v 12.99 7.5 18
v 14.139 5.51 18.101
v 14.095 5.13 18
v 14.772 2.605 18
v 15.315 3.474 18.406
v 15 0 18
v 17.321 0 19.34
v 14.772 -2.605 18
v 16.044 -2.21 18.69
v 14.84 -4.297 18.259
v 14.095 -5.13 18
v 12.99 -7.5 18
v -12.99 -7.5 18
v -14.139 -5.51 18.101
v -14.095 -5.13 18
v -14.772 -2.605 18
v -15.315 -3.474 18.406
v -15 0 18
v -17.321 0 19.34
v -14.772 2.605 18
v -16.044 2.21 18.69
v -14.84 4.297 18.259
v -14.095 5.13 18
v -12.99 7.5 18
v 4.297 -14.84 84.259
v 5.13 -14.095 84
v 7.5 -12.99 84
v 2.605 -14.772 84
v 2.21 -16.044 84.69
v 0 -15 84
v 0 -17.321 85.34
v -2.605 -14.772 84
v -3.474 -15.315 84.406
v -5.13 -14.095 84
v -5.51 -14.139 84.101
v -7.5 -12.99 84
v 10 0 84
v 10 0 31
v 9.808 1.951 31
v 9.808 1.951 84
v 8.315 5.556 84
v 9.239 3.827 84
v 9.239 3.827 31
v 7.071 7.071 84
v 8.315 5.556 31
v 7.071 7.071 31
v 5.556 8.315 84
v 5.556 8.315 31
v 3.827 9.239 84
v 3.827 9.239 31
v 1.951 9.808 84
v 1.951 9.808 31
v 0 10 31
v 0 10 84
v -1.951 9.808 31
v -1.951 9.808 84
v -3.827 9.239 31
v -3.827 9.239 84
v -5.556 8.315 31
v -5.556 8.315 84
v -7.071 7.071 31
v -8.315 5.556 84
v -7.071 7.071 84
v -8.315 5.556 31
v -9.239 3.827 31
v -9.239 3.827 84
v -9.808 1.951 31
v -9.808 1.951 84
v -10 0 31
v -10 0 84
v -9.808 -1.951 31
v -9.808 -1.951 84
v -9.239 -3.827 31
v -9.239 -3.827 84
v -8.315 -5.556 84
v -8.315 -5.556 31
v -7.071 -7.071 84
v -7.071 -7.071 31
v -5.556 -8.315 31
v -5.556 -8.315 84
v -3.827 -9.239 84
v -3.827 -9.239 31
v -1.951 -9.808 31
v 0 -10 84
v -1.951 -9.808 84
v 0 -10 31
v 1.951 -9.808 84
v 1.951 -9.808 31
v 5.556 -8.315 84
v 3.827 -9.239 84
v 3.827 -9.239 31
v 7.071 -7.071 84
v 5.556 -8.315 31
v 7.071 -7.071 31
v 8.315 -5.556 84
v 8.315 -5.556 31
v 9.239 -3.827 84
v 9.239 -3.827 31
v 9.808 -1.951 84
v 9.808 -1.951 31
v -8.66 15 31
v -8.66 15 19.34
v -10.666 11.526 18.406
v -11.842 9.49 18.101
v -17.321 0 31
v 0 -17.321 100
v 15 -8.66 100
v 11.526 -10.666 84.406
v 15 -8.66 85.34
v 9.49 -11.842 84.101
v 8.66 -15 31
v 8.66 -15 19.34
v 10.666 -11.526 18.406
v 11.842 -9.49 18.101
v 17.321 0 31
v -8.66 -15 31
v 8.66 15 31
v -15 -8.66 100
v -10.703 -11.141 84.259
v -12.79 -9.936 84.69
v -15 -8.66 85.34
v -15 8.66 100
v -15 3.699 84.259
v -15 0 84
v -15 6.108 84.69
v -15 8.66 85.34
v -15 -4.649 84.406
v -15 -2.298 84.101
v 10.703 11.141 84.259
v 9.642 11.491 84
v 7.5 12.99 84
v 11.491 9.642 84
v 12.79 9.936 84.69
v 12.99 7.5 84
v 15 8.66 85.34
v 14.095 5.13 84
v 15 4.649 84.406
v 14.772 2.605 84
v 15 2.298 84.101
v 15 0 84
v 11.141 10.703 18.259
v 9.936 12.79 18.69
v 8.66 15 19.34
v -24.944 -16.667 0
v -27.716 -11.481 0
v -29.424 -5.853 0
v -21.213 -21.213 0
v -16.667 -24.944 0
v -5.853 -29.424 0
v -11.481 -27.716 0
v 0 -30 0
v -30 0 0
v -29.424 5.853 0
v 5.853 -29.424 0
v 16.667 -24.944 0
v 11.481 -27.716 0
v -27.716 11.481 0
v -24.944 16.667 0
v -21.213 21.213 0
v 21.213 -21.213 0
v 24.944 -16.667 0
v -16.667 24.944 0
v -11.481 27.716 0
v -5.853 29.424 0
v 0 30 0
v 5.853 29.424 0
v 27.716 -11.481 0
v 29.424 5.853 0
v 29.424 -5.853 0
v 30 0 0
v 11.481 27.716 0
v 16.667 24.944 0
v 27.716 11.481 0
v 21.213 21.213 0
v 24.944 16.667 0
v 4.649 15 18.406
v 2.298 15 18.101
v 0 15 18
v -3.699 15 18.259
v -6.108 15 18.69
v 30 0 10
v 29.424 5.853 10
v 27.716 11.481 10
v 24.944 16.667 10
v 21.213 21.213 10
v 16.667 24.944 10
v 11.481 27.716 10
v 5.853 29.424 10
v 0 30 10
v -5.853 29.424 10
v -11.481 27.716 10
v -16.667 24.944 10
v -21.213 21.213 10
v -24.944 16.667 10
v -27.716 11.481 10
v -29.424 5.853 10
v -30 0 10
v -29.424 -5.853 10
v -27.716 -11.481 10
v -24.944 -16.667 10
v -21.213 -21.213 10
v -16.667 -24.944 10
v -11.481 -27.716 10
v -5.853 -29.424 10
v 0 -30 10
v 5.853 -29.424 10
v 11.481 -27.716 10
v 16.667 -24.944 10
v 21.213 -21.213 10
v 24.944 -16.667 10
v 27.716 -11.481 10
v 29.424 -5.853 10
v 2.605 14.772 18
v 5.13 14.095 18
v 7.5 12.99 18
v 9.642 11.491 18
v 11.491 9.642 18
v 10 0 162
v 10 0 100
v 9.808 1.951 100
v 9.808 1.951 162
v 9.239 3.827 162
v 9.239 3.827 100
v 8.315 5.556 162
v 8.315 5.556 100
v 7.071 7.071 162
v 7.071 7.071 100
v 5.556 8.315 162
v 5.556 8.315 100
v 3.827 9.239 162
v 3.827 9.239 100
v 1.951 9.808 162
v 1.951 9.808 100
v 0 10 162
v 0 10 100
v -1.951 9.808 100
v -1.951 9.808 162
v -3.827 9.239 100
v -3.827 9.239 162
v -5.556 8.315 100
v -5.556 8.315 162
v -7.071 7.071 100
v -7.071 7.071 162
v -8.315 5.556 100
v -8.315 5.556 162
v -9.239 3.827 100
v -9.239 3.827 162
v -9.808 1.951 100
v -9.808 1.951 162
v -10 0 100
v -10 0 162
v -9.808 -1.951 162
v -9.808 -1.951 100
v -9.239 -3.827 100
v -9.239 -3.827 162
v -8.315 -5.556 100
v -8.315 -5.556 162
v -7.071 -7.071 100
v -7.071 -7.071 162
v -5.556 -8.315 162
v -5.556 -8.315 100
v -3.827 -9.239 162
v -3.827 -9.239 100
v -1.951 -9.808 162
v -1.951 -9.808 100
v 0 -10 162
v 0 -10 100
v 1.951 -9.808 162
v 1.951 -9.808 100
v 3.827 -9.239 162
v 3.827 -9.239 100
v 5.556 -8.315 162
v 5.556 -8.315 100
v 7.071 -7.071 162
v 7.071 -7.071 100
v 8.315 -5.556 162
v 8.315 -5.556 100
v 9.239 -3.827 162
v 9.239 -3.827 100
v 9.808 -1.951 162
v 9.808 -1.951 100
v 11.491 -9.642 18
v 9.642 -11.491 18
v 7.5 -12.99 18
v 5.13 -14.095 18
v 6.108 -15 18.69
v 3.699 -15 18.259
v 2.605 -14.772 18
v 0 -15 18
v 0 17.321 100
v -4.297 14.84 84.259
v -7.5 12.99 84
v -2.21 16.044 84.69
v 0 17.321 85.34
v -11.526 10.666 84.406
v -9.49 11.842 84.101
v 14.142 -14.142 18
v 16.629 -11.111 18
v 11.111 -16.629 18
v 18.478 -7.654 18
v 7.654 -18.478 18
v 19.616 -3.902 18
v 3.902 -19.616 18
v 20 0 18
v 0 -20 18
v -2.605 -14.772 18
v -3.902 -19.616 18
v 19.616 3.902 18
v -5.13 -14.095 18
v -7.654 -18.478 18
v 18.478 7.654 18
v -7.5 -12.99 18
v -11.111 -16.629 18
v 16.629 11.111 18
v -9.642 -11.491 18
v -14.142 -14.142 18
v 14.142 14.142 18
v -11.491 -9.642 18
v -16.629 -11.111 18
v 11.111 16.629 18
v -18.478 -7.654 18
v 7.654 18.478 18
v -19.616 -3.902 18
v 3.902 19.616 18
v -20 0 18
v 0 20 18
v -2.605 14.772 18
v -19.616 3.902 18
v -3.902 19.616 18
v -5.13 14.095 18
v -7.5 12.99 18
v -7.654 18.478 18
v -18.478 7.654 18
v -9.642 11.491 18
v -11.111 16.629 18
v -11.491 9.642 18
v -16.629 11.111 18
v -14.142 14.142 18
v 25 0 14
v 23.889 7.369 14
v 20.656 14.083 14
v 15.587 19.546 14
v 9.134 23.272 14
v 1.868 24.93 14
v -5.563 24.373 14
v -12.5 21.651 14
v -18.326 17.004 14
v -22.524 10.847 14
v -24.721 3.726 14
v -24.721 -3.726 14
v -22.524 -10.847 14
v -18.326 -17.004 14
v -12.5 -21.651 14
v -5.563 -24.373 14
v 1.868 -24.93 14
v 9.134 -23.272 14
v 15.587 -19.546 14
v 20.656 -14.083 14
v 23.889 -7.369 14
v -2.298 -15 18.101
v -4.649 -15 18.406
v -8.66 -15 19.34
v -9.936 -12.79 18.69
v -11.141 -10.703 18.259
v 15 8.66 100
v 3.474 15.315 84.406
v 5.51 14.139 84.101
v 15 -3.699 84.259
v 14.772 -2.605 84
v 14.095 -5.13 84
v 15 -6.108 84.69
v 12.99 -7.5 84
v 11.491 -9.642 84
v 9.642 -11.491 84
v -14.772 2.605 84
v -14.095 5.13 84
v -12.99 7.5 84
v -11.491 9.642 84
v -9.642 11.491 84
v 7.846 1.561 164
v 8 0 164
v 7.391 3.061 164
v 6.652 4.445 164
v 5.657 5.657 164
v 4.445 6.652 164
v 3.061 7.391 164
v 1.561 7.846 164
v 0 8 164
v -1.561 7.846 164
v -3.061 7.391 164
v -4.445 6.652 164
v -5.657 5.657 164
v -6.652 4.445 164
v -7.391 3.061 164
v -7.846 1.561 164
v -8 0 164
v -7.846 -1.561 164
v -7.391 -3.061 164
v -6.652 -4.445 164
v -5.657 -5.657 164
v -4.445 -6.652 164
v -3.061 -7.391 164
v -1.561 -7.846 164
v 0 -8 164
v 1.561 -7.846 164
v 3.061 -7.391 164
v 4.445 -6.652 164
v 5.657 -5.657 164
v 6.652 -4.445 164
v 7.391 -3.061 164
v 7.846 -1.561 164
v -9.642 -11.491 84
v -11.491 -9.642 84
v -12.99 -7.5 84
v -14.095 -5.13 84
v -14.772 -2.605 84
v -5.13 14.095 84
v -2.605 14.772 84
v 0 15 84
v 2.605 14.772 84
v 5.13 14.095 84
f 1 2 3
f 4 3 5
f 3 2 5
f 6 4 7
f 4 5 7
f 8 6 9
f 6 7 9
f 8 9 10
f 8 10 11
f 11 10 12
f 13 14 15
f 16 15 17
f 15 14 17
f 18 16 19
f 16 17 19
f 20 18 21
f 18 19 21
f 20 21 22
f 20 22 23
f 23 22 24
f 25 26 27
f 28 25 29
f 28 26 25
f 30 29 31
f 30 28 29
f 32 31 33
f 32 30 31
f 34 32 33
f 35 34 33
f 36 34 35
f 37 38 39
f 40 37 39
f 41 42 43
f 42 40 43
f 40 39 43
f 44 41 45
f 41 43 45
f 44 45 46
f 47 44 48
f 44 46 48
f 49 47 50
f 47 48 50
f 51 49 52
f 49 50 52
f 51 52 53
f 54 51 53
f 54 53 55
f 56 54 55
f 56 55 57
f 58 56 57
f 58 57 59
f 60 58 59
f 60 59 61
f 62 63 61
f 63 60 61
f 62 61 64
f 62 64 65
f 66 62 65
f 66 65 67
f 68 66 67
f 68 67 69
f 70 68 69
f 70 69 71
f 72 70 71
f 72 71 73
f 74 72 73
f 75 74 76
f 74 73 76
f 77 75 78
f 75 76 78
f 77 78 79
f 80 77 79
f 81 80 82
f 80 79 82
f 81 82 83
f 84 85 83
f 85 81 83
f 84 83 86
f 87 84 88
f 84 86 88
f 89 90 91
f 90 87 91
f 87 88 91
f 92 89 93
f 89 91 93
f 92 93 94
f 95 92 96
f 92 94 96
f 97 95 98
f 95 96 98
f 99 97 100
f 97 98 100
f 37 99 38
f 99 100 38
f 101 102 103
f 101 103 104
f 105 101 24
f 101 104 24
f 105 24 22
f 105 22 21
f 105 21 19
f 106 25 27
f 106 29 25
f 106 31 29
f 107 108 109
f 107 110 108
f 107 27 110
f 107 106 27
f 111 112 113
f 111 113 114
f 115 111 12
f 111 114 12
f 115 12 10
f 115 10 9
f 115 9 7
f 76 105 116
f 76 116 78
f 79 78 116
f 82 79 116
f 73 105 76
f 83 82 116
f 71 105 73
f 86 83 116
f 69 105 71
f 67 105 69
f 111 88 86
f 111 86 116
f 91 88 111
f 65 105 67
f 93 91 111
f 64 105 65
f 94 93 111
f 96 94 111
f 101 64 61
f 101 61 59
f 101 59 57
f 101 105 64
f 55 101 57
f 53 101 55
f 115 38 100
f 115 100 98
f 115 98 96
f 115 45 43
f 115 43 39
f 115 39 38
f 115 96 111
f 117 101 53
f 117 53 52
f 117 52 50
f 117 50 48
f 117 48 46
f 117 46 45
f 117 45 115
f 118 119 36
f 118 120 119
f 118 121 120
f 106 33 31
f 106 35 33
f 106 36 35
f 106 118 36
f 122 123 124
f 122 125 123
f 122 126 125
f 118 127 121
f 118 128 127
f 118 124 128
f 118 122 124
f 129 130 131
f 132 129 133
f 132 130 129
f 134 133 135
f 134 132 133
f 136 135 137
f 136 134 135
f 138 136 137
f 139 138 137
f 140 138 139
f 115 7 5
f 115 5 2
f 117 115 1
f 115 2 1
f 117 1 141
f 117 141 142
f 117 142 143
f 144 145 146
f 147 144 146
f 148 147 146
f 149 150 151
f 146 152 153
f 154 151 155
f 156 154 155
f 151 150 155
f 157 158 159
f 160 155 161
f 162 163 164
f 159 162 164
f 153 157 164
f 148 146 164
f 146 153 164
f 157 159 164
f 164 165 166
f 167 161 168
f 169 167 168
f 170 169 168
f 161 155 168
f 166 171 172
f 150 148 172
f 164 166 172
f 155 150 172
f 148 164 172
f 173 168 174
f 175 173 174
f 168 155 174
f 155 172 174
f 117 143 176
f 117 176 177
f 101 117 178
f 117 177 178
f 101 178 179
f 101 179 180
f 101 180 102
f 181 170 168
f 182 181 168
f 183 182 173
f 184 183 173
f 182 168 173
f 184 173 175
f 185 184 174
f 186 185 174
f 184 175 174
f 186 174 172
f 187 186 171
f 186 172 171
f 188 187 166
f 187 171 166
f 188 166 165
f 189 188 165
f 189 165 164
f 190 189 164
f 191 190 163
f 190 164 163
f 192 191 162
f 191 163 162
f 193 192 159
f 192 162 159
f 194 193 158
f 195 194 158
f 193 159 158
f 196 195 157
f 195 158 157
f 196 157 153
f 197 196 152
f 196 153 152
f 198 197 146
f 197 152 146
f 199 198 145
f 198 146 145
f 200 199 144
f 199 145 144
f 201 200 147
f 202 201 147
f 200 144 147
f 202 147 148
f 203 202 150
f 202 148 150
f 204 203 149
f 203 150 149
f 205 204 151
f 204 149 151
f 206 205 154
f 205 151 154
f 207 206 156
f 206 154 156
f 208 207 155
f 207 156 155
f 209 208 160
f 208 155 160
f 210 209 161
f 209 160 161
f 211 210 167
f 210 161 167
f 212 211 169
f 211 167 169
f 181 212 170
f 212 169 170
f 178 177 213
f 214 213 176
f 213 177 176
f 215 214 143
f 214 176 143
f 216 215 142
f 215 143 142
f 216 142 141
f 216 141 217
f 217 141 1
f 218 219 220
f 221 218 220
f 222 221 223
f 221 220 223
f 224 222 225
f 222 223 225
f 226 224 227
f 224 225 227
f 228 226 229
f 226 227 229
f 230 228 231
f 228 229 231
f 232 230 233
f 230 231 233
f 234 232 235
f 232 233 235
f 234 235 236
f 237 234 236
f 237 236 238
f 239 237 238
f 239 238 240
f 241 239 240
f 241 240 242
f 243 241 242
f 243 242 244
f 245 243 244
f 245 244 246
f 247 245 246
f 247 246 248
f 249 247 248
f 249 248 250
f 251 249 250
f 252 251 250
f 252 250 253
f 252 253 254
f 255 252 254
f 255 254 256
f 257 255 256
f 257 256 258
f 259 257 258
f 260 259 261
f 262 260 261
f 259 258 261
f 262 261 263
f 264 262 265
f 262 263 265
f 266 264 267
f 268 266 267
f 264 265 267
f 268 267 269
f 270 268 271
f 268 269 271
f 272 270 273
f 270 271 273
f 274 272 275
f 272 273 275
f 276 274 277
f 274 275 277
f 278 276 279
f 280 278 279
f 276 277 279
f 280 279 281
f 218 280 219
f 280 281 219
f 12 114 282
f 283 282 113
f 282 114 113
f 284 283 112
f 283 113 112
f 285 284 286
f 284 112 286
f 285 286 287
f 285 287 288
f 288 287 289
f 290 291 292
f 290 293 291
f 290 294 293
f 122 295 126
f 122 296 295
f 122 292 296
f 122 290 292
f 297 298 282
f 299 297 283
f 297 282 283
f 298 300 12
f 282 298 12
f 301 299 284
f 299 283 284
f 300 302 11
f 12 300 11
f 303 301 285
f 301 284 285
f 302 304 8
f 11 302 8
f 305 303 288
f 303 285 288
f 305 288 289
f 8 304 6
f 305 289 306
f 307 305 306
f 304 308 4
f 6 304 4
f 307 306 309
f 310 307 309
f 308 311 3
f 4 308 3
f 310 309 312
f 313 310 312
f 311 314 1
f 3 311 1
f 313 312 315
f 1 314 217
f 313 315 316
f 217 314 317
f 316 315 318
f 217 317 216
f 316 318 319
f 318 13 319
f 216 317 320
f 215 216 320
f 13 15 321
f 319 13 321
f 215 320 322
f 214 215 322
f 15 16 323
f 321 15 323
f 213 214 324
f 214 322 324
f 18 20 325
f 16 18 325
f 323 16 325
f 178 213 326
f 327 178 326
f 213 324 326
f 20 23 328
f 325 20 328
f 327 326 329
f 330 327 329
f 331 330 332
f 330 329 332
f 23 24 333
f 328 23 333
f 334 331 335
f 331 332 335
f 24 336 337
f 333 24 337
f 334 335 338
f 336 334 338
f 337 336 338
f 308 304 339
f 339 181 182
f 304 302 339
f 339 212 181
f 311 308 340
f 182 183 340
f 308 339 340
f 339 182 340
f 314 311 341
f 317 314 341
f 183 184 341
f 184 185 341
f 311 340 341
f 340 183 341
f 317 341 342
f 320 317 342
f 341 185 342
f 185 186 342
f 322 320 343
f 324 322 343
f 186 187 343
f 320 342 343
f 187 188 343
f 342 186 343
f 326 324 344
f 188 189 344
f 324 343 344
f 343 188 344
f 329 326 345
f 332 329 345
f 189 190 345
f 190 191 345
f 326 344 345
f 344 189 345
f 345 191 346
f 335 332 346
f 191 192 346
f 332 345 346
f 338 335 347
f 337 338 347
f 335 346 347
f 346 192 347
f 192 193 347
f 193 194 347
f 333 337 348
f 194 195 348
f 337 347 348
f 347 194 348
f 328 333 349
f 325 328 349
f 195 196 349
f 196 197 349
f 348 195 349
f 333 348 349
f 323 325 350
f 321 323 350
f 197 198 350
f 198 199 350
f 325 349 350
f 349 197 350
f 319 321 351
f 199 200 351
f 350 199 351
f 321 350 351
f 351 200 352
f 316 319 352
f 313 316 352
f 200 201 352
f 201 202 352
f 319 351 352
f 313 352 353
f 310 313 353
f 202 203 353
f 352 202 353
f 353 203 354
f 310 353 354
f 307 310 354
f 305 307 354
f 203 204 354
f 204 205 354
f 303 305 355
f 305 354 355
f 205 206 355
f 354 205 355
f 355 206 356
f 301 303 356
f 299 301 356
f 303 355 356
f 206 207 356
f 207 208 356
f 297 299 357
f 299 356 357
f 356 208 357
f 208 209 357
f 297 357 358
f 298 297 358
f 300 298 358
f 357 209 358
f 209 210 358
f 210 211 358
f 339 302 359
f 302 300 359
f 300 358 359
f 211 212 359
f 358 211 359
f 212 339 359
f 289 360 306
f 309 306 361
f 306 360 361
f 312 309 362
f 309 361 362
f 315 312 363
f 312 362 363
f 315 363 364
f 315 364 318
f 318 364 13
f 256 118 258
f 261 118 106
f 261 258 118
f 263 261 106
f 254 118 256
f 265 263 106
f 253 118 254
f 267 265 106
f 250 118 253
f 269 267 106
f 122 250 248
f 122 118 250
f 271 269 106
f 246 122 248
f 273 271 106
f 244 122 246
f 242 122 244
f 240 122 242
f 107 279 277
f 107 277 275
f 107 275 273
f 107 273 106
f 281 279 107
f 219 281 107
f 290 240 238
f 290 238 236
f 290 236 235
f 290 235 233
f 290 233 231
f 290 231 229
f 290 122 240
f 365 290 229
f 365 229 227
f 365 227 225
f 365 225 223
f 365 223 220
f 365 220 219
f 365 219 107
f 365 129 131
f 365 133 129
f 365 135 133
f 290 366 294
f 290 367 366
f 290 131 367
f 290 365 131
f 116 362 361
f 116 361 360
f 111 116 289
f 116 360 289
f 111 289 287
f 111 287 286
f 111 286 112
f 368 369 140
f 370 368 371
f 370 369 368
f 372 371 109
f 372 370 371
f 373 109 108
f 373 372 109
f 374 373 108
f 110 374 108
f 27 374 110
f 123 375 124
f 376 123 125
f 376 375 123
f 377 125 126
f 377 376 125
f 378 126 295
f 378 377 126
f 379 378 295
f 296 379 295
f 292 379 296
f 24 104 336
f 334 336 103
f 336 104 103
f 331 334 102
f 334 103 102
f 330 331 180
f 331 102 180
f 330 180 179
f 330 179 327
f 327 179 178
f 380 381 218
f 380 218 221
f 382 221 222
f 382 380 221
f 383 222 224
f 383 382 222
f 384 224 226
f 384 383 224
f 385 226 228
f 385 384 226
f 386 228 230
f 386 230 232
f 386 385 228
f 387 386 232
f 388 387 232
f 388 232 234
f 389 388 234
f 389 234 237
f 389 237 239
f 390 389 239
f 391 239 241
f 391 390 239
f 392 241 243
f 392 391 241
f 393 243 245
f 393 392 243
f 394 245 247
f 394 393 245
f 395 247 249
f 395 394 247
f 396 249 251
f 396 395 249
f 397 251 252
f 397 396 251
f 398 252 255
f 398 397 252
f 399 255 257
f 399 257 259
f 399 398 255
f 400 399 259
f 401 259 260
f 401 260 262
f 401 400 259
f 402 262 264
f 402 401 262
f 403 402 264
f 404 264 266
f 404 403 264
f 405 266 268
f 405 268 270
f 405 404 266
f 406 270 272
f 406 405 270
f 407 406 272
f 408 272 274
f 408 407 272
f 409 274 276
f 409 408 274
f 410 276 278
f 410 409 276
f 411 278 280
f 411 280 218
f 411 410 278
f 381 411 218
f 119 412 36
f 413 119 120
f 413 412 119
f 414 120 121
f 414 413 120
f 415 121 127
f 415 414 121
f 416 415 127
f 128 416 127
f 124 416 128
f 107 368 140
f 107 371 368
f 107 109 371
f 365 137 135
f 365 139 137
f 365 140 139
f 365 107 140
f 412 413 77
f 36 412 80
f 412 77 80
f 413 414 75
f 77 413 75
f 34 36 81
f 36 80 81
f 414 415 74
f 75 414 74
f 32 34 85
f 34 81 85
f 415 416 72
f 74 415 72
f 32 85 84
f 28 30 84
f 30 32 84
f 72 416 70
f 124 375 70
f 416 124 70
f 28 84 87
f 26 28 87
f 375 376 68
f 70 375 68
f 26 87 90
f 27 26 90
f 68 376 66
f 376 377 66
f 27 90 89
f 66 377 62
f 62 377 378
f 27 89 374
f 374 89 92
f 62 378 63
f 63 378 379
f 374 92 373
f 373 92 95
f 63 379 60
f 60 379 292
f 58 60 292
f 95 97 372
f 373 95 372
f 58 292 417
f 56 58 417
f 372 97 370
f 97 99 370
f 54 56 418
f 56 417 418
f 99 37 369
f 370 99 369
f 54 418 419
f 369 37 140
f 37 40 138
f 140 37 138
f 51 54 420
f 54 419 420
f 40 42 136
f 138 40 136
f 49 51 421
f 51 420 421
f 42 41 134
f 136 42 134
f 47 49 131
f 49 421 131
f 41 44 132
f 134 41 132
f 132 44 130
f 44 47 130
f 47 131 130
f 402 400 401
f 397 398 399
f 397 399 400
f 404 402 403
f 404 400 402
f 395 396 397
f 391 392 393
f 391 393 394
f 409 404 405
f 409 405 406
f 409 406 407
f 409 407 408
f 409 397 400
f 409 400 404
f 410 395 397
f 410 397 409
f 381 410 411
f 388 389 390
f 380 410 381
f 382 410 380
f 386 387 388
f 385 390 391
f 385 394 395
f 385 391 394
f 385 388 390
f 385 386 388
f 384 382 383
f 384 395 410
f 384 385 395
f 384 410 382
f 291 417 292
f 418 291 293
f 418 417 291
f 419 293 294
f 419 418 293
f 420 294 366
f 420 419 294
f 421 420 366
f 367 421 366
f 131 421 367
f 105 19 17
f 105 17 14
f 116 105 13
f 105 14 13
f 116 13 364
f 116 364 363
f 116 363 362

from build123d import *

# Parameters (mm, degrees)
F0_R      = 30
F1_DEPTH  = 18
F2_R      = 10
F3_DEPTH  = 146
F4_SIZE   = 2
F5_SIZE2  = 8
F5_SIZE   = 10
F7_DEPTH  = 13
F10_DEPTH = 16


with BuildPart() as f1:
    # F0 (on Top) → F1 (new body)
    with BuildSketch(Plane.XY):
        Circle(F0_R)
    extrude(amount=F1_DEPTH)

    # F2 (on face) → F3 (join)
    with BuildSketch(Plane.XY.offset(18)):
        Circle(F2_R)
    extrude(amount=F3_DEPTH)

    # F4
    f4_edges = [f1.edges().sort_by_distance(p)[0] for p in [
        (-10, 0, 164),
    ]]
    chamfer(f4_edges, length=F4_SIZE)

    # F5
    f5_edges = [f1.edges().sort_by_distance(p)[0] for p in [
        (-30, 0, 18),
    ]]
    f5_side = f1.faces().sort_by_distance((-29.151472, 0, 18))[0]
    chamfer(f5_edges, length=F5_SIZE, length2=F5_SIZE2, reference=f5_side)

    # F6 (on face) → F7 (join)
    with BuildSketch(Plane.XY.offset(18)):
        Polygon((8.6602540378, -15), (17.3205080757, 0), (8.6602540378, 15), (-8.6602540378, 15), (-17.3205080757, 0), (-8.6602540378, -15), align=None)
    extrude(amount=F7_DEPTH)

    # F9 (on offset) → F10 (join)
    with BuildSketch(Plane.XY.offset(100)):
        Polygon((15, 8.6602540378), (0, 17.3205080757), (-15, 8.6602540378), (-15, -8.6602540378), (0, -17.3205080757), (15, -8.6602540378), align=None)
    extrude(amount=-F10_DEPTH)

    # F11 (on Right) → F12 (revolve, cut)
    with BuildSketch(Plane.YZ):
        Polygon((15, 84), (17.3205080757, 84), (17.3205080757, 85.3397459622), align=None)
    revolve(axis=Axis((0, 0, 18), (0, 0, -1)), mode=Mode.SUBTRACT)

    # F13 (on Front) → F14 (revolve, cut)
    with BuildSketch(Plane.XZ):
        Polygon((-17.3205080757, 18), (-15, 18), (-17.3205080757, 19.3397459622), align=None)
    revolve(axis=Axis((0, 0, 18), (0, 0, -1)), mode=Mode.SUBTRACT)


solid = f1.part
